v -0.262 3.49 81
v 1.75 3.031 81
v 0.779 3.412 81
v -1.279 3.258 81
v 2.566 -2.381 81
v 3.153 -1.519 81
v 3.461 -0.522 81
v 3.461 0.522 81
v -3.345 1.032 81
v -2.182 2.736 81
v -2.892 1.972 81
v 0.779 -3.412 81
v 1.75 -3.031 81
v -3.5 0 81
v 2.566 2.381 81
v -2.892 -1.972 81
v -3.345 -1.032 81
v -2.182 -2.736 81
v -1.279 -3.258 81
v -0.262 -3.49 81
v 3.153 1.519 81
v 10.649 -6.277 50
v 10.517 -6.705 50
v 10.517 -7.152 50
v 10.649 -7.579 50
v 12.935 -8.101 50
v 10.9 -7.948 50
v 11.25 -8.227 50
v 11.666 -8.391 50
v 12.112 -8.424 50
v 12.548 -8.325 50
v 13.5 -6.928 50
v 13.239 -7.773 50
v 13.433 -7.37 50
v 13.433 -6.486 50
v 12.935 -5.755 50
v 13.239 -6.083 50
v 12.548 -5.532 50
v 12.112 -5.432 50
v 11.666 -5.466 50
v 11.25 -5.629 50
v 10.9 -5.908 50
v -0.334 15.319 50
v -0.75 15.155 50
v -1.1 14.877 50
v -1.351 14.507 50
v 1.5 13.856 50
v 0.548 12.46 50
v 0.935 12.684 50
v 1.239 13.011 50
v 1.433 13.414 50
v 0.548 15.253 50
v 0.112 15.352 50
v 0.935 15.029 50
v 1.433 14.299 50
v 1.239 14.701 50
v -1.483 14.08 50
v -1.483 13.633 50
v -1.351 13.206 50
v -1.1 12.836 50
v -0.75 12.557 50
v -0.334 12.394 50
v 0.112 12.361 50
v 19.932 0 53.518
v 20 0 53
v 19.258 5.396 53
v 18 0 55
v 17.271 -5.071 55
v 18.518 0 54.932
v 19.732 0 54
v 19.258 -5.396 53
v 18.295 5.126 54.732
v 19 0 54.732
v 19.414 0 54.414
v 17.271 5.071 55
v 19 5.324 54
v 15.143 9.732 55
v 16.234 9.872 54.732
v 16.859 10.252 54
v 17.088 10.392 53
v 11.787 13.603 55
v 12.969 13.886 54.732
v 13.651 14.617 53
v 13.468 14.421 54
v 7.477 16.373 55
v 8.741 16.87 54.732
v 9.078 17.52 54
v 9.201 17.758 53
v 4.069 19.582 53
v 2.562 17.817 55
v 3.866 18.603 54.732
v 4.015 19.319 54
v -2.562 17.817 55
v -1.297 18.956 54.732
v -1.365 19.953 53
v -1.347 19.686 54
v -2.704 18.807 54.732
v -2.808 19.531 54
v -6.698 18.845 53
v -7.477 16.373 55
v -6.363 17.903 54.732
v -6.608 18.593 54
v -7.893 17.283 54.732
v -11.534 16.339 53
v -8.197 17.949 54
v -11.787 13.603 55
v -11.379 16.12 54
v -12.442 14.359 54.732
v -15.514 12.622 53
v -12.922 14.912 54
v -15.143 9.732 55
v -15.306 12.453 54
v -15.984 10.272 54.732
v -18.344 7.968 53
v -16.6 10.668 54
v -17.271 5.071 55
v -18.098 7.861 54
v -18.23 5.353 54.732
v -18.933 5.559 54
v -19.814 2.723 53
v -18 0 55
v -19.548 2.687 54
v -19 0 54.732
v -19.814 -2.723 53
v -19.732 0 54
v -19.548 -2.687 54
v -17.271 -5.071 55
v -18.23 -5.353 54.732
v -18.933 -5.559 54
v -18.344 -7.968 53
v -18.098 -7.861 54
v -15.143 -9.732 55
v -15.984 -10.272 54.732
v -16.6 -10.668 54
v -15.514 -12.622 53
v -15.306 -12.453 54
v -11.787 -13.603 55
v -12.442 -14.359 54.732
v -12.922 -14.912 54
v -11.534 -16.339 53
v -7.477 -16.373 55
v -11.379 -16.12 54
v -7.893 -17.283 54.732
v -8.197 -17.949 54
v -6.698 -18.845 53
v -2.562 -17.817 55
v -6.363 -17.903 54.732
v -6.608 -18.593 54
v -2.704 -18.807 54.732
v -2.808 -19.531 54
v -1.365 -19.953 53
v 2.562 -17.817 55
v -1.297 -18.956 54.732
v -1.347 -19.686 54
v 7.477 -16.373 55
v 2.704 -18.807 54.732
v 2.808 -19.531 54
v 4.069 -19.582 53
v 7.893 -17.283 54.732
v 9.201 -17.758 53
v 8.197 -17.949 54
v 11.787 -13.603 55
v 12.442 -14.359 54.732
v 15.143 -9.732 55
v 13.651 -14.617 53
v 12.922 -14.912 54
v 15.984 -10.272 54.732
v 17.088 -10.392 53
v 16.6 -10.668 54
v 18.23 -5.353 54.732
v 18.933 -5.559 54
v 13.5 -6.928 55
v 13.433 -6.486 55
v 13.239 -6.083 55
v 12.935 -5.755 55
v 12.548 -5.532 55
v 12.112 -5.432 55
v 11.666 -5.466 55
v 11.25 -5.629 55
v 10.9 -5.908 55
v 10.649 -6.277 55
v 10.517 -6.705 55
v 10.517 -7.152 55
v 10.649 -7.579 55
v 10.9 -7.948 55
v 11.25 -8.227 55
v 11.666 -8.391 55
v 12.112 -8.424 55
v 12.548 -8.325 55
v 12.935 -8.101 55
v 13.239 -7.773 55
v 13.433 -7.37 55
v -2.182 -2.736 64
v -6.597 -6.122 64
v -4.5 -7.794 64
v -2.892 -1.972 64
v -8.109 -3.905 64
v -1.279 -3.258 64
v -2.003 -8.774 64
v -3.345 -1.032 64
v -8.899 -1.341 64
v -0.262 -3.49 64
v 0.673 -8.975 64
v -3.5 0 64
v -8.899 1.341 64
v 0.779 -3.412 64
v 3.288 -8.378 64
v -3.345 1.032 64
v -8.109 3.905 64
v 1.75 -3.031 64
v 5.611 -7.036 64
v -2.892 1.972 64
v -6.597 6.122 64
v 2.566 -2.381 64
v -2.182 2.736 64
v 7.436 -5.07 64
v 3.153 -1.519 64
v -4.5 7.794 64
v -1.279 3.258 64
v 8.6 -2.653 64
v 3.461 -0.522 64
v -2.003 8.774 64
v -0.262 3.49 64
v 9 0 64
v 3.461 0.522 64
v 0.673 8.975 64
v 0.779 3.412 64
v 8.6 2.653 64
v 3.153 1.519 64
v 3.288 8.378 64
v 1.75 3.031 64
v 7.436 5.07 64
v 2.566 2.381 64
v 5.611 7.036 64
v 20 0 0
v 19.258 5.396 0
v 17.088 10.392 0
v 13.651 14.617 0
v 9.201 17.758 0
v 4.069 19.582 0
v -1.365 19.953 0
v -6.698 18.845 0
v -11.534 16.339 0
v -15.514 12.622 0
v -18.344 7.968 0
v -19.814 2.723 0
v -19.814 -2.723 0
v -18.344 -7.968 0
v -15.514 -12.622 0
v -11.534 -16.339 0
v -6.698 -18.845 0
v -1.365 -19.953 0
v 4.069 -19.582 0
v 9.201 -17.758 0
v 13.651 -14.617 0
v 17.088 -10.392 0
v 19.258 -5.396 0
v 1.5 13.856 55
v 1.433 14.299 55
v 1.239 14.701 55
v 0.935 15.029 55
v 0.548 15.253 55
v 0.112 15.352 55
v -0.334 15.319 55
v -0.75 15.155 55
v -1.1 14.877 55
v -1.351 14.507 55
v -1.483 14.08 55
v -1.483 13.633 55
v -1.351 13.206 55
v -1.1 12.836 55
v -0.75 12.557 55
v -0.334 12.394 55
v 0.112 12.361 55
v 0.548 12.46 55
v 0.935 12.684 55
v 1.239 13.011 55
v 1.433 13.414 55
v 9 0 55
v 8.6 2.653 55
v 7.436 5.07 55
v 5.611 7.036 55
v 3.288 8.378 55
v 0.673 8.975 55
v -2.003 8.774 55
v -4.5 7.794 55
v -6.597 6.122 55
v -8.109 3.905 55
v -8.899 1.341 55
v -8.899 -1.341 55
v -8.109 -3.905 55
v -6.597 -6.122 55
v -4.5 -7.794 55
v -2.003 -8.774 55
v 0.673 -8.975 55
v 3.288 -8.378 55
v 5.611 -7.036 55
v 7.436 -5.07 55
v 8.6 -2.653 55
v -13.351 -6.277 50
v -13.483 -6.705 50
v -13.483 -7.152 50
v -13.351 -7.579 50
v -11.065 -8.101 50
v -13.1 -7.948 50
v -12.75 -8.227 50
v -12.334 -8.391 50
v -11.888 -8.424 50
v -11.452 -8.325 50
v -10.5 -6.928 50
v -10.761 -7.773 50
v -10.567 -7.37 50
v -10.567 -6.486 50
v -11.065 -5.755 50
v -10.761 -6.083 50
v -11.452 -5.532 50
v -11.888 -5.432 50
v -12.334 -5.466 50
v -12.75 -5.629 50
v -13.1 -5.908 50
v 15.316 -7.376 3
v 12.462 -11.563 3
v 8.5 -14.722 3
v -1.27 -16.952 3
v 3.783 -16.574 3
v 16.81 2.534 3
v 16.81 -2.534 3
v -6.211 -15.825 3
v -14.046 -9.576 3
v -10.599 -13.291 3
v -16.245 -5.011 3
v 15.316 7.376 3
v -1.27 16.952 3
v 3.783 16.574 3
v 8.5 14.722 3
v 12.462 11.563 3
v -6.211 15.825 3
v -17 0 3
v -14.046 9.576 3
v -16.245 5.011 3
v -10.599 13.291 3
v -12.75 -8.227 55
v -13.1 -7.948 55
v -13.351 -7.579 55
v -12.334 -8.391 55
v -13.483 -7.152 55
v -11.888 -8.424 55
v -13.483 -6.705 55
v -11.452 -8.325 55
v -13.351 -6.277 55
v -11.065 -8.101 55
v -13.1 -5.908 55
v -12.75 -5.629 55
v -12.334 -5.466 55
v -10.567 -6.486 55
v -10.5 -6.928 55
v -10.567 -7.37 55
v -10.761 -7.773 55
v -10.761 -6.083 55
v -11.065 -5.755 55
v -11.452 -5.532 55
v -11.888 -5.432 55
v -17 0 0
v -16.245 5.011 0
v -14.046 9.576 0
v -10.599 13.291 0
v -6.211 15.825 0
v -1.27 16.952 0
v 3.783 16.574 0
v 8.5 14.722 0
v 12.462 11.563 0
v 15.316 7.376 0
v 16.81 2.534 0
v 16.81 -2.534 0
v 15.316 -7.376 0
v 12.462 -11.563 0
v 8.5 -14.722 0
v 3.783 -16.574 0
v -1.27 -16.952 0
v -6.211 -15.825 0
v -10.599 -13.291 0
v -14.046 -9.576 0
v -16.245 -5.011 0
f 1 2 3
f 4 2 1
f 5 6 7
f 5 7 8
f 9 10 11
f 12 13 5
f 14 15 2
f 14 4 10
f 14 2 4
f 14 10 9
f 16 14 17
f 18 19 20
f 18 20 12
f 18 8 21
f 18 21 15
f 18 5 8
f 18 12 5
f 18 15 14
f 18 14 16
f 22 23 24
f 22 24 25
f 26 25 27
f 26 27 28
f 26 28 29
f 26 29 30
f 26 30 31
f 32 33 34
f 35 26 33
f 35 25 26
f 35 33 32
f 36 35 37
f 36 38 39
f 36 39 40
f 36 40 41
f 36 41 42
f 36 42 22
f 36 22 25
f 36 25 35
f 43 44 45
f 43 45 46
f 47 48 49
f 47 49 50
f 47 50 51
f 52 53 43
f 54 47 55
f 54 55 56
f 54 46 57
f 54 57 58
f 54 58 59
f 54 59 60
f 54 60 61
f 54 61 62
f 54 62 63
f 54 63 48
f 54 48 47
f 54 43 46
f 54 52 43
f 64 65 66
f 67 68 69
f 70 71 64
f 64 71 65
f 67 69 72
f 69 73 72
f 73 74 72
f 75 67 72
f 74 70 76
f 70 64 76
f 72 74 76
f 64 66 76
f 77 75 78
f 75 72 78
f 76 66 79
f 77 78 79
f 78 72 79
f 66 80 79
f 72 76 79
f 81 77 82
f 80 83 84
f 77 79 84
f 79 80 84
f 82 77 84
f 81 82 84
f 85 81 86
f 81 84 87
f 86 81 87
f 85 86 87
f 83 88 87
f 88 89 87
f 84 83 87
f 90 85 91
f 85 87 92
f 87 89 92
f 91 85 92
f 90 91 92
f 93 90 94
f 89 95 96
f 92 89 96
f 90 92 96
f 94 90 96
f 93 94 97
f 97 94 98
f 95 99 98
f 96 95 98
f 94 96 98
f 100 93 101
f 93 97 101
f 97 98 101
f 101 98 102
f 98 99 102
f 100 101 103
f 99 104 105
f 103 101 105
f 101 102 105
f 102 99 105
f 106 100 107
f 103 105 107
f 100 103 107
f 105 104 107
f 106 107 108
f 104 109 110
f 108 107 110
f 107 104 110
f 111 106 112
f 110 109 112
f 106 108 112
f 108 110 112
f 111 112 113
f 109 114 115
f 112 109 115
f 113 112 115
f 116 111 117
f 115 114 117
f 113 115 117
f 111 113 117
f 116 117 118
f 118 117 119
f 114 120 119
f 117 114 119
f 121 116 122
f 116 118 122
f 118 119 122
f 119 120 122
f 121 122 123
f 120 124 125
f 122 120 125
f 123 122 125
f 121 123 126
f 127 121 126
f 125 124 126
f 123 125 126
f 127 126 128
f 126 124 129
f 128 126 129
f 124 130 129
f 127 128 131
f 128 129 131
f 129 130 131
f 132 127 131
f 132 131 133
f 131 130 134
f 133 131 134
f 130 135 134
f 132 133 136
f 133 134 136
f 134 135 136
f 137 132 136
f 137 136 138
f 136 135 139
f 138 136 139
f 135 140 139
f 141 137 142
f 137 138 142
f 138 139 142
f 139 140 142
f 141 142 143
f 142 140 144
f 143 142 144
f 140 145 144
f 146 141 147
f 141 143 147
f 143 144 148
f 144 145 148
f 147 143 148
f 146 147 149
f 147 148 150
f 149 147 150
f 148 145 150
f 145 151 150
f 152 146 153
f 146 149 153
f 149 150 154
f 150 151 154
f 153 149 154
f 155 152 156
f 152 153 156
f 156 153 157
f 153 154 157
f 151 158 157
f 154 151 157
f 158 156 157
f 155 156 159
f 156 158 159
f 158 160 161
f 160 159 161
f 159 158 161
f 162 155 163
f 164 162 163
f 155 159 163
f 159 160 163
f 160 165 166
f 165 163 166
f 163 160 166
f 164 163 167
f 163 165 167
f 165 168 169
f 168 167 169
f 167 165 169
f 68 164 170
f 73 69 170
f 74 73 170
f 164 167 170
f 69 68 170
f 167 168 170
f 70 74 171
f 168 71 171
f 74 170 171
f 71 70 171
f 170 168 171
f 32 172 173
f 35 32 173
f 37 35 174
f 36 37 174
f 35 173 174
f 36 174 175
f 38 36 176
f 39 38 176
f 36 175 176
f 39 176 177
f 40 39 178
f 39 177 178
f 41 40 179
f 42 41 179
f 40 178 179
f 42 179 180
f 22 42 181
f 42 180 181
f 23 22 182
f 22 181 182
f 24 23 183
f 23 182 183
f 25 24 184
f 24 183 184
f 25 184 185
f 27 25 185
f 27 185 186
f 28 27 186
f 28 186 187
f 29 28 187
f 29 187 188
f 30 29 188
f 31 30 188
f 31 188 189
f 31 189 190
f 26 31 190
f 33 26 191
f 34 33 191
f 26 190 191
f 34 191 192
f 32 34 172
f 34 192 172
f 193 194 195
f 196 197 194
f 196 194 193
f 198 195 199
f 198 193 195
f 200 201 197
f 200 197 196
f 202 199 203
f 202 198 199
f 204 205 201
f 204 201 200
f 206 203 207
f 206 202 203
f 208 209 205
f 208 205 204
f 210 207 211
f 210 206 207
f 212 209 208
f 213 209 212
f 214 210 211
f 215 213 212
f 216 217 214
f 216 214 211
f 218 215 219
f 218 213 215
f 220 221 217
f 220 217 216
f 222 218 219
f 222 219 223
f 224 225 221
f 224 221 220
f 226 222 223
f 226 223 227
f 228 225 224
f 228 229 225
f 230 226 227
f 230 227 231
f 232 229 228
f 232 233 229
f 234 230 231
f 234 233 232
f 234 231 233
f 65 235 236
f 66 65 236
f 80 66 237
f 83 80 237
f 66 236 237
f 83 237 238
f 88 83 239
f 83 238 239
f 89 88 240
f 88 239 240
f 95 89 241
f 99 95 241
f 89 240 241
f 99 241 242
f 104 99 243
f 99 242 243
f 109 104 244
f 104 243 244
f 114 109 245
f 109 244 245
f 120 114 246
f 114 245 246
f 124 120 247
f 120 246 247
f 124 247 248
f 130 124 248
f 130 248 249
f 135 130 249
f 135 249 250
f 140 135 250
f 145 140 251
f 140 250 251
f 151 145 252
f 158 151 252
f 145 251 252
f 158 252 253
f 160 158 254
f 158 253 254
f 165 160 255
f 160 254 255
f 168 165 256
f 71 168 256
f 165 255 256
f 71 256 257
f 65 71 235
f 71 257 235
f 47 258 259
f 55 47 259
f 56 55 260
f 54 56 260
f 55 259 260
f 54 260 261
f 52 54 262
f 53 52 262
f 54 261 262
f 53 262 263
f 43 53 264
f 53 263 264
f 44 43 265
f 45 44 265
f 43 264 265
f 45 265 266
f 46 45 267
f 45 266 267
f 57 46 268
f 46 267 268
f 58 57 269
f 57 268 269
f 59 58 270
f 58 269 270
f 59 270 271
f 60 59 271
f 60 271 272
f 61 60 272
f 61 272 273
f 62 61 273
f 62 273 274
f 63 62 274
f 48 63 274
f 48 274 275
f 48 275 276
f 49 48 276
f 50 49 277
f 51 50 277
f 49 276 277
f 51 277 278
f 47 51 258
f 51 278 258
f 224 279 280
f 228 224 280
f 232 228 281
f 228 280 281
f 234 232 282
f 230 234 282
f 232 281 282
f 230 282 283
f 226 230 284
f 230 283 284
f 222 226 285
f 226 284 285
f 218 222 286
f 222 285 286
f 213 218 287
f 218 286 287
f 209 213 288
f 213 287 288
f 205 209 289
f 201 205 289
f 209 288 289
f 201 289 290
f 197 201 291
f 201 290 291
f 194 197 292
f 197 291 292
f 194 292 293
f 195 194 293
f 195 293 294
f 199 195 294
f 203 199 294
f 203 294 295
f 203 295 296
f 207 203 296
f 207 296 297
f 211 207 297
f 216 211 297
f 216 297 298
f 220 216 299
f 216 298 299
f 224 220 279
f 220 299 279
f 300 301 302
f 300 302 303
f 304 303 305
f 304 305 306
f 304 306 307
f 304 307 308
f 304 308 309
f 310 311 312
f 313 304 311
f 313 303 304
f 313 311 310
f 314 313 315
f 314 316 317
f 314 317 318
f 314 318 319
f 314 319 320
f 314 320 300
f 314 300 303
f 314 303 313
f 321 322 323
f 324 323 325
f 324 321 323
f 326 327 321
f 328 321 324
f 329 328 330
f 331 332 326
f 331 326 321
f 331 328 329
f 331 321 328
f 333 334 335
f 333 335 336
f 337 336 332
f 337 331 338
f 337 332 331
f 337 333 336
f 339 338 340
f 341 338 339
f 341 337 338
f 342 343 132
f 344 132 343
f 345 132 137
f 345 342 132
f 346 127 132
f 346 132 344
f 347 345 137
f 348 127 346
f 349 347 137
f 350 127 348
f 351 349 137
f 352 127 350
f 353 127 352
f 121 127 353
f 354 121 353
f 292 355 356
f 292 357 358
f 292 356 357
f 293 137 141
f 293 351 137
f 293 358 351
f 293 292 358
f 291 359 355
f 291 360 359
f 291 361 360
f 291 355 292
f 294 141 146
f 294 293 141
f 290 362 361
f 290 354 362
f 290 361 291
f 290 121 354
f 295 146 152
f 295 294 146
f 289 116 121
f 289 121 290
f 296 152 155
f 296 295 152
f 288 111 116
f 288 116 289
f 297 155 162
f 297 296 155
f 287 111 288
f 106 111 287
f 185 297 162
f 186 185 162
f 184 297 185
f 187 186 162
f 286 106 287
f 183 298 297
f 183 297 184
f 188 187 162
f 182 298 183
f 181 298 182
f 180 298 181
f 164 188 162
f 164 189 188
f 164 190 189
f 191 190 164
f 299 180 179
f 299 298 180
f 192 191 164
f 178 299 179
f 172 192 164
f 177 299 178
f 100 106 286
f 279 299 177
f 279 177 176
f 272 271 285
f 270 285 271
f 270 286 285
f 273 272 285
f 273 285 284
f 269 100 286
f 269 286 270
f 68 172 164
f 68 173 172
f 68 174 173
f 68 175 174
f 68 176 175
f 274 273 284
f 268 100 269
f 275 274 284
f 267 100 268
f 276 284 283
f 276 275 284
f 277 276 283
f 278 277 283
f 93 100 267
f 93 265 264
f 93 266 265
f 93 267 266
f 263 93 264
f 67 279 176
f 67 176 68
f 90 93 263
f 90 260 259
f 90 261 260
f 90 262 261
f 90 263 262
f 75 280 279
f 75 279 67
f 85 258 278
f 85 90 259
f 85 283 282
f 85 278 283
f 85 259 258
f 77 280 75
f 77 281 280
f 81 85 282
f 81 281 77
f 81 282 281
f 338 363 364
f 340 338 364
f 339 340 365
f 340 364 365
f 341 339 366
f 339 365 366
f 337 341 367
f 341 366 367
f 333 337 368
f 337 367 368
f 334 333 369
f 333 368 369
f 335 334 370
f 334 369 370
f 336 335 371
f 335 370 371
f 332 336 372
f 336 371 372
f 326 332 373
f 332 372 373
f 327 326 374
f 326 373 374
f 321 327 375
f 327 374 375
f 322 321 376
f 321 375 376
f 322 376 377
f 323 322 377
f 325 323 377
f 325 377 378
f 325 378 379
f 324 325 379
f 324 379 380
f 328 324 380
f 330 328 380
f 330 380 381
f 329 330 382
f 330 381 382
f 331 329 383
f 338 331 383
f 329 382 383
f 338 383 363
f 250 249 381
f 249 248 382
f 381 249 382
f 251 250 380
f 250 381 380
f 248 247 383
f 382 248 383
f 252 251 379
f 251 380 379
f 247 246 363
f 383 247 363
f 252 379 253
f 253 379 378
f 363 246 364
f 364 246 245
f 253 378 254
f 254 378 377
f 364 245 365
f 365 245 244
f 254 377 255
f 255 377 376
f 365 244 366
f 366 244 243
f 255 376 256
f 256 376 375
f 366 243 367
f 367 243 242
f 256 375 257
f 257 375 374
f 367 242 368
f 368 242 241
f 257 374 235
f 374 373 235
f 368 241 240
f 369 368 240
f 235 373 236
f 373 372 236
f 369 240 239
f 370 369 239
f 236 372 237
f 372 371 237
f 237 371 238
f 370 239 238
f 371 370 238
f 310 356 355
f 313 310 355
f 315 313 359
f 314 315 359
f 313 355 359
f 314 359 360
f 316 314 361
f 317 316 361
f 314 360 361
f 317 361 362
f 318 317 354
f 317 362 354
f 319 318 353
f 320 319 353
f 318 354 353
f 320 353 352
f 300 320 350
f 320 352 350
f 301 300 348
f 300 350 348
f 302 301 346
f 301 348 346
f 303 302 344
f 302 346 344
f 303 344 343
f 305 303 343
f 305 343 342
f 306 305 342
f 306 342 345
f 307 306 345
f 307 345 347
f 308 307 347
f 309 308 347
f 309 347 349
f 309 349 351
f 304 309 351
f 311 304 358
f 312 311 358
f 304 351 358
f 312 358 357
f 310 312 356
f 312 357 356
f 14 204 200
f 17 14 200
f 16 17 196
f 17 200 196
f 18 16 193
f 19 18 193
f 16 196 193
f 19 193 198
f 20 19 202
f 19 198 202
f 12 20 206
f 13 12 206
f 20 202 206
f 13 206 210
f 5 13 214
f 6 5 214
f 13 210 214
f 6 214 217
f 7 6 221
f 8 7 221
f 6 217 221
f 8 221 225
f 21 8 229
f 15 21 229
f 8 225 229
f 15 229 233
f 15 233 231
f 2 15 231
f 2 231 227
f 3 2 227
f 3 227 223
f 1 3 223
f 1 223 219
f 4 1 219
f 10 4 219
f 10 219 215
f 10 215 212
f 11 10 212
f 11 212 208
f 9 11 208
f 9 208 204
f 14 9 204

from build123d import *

# Parameters (mm, degrees)
SKETCH1_R               = 20
BOSS_EXTRUDE1_DEPTH     = 55
SKETCH3_R               = 9
BOSS_EXTRUDE2_DEPTH     = 9
CUT_EXTRUDE1_DEPTH      = 100
CUT_EXTRUDE1_DEPTH_BACK = 2
SKETCH2_R               = 3.5
SKETCH6_R               = 3.5
BOSS_EXTRUDE3_DEPTH     = 28
SKETCH7_R               = 17
CUT_EXTRUDE2_DEPTH      = 3
FILLET2_R               = 2
SKETCH8_R               = 1.5
CUT_EXTRUDE3_DEPTH      = 5


with BuildPart() as part:
    # Sketch1 → Boss-Extrude1 (new body)
    with BuildSketch(Plane.XY):
        Circle(SKETCH1_R)
    extrude(amount=BOSS_EXTRUDE1_DEPTH)

    # Sketch3 → Boss-Extrude2 (add)
    with BuildSketch(Plane.XY.offset(55)):
        Circle(SKETCH3_R)
    extrude(amount=BOSS_EXTRUDE2_DEPTH)

    # Sketch2 → Cut-Extrude1 (cut, two sides: drawn at the far end of the back side and taken through both)
    with BuildSketch(Plane.XY.offset(55).offset(-CUT_EXTRUDE1_DEPTH_BACK)):
        Circle(SKETCH2_R)
    extrude(amount=CUT_EXTRUDE1_DEPTH + CUT_EXTRUDE1_DEPTH_BACK, mode=Mode.SUBTRACT)

    # Sketch6 → Boss-Extrude3 (add)
    with BuildSketch(Plane.XY.offset(53)):
        with Locations(Location((0, 0, 0), (0, 0, 180))):
            Circle(SKETCH6_R)
    extrude(amount=BOSS_EXTRUDE3_DEPTH)

    # Sketch7 → Cut-Extrude2 (cut)
    with BuildSketch(Plane(origin=(0, 0, 0), x_dir=(-1, 0, 0), z_dir=(0, 0, -1))):
        Circle(SKETCH7_R)
    extrude(amount=-CUT_EXTRUDE2_DEPTH, mode=Mode.SUBTRACT)

    # Fillet2
    fillet2_edges = [part.edges().sort_by_distance(p)[0] for p in [
        (-20, 0, 55),
    ]]
    fillet(fillet2_edges, radius=FILLET2_R)

    # Sketch8 → Cut-Extrude3 (cut)
    with BuildSketch(Plane.XY.offset(55)):
        with Locations((0, 13.856406461)):
            Circle(SKETCH8_R)
        with Locations((-12, -6.92820323)):
            Circle(SKETCH8_R)
        with Locations((12, -6.92820323)):
            Circle(SKETCH8_R)
    extrude(amount=-CUT_EXTRUDE3_DEPTH, mode=Mode.SUBTRACT)


solid = part.part
